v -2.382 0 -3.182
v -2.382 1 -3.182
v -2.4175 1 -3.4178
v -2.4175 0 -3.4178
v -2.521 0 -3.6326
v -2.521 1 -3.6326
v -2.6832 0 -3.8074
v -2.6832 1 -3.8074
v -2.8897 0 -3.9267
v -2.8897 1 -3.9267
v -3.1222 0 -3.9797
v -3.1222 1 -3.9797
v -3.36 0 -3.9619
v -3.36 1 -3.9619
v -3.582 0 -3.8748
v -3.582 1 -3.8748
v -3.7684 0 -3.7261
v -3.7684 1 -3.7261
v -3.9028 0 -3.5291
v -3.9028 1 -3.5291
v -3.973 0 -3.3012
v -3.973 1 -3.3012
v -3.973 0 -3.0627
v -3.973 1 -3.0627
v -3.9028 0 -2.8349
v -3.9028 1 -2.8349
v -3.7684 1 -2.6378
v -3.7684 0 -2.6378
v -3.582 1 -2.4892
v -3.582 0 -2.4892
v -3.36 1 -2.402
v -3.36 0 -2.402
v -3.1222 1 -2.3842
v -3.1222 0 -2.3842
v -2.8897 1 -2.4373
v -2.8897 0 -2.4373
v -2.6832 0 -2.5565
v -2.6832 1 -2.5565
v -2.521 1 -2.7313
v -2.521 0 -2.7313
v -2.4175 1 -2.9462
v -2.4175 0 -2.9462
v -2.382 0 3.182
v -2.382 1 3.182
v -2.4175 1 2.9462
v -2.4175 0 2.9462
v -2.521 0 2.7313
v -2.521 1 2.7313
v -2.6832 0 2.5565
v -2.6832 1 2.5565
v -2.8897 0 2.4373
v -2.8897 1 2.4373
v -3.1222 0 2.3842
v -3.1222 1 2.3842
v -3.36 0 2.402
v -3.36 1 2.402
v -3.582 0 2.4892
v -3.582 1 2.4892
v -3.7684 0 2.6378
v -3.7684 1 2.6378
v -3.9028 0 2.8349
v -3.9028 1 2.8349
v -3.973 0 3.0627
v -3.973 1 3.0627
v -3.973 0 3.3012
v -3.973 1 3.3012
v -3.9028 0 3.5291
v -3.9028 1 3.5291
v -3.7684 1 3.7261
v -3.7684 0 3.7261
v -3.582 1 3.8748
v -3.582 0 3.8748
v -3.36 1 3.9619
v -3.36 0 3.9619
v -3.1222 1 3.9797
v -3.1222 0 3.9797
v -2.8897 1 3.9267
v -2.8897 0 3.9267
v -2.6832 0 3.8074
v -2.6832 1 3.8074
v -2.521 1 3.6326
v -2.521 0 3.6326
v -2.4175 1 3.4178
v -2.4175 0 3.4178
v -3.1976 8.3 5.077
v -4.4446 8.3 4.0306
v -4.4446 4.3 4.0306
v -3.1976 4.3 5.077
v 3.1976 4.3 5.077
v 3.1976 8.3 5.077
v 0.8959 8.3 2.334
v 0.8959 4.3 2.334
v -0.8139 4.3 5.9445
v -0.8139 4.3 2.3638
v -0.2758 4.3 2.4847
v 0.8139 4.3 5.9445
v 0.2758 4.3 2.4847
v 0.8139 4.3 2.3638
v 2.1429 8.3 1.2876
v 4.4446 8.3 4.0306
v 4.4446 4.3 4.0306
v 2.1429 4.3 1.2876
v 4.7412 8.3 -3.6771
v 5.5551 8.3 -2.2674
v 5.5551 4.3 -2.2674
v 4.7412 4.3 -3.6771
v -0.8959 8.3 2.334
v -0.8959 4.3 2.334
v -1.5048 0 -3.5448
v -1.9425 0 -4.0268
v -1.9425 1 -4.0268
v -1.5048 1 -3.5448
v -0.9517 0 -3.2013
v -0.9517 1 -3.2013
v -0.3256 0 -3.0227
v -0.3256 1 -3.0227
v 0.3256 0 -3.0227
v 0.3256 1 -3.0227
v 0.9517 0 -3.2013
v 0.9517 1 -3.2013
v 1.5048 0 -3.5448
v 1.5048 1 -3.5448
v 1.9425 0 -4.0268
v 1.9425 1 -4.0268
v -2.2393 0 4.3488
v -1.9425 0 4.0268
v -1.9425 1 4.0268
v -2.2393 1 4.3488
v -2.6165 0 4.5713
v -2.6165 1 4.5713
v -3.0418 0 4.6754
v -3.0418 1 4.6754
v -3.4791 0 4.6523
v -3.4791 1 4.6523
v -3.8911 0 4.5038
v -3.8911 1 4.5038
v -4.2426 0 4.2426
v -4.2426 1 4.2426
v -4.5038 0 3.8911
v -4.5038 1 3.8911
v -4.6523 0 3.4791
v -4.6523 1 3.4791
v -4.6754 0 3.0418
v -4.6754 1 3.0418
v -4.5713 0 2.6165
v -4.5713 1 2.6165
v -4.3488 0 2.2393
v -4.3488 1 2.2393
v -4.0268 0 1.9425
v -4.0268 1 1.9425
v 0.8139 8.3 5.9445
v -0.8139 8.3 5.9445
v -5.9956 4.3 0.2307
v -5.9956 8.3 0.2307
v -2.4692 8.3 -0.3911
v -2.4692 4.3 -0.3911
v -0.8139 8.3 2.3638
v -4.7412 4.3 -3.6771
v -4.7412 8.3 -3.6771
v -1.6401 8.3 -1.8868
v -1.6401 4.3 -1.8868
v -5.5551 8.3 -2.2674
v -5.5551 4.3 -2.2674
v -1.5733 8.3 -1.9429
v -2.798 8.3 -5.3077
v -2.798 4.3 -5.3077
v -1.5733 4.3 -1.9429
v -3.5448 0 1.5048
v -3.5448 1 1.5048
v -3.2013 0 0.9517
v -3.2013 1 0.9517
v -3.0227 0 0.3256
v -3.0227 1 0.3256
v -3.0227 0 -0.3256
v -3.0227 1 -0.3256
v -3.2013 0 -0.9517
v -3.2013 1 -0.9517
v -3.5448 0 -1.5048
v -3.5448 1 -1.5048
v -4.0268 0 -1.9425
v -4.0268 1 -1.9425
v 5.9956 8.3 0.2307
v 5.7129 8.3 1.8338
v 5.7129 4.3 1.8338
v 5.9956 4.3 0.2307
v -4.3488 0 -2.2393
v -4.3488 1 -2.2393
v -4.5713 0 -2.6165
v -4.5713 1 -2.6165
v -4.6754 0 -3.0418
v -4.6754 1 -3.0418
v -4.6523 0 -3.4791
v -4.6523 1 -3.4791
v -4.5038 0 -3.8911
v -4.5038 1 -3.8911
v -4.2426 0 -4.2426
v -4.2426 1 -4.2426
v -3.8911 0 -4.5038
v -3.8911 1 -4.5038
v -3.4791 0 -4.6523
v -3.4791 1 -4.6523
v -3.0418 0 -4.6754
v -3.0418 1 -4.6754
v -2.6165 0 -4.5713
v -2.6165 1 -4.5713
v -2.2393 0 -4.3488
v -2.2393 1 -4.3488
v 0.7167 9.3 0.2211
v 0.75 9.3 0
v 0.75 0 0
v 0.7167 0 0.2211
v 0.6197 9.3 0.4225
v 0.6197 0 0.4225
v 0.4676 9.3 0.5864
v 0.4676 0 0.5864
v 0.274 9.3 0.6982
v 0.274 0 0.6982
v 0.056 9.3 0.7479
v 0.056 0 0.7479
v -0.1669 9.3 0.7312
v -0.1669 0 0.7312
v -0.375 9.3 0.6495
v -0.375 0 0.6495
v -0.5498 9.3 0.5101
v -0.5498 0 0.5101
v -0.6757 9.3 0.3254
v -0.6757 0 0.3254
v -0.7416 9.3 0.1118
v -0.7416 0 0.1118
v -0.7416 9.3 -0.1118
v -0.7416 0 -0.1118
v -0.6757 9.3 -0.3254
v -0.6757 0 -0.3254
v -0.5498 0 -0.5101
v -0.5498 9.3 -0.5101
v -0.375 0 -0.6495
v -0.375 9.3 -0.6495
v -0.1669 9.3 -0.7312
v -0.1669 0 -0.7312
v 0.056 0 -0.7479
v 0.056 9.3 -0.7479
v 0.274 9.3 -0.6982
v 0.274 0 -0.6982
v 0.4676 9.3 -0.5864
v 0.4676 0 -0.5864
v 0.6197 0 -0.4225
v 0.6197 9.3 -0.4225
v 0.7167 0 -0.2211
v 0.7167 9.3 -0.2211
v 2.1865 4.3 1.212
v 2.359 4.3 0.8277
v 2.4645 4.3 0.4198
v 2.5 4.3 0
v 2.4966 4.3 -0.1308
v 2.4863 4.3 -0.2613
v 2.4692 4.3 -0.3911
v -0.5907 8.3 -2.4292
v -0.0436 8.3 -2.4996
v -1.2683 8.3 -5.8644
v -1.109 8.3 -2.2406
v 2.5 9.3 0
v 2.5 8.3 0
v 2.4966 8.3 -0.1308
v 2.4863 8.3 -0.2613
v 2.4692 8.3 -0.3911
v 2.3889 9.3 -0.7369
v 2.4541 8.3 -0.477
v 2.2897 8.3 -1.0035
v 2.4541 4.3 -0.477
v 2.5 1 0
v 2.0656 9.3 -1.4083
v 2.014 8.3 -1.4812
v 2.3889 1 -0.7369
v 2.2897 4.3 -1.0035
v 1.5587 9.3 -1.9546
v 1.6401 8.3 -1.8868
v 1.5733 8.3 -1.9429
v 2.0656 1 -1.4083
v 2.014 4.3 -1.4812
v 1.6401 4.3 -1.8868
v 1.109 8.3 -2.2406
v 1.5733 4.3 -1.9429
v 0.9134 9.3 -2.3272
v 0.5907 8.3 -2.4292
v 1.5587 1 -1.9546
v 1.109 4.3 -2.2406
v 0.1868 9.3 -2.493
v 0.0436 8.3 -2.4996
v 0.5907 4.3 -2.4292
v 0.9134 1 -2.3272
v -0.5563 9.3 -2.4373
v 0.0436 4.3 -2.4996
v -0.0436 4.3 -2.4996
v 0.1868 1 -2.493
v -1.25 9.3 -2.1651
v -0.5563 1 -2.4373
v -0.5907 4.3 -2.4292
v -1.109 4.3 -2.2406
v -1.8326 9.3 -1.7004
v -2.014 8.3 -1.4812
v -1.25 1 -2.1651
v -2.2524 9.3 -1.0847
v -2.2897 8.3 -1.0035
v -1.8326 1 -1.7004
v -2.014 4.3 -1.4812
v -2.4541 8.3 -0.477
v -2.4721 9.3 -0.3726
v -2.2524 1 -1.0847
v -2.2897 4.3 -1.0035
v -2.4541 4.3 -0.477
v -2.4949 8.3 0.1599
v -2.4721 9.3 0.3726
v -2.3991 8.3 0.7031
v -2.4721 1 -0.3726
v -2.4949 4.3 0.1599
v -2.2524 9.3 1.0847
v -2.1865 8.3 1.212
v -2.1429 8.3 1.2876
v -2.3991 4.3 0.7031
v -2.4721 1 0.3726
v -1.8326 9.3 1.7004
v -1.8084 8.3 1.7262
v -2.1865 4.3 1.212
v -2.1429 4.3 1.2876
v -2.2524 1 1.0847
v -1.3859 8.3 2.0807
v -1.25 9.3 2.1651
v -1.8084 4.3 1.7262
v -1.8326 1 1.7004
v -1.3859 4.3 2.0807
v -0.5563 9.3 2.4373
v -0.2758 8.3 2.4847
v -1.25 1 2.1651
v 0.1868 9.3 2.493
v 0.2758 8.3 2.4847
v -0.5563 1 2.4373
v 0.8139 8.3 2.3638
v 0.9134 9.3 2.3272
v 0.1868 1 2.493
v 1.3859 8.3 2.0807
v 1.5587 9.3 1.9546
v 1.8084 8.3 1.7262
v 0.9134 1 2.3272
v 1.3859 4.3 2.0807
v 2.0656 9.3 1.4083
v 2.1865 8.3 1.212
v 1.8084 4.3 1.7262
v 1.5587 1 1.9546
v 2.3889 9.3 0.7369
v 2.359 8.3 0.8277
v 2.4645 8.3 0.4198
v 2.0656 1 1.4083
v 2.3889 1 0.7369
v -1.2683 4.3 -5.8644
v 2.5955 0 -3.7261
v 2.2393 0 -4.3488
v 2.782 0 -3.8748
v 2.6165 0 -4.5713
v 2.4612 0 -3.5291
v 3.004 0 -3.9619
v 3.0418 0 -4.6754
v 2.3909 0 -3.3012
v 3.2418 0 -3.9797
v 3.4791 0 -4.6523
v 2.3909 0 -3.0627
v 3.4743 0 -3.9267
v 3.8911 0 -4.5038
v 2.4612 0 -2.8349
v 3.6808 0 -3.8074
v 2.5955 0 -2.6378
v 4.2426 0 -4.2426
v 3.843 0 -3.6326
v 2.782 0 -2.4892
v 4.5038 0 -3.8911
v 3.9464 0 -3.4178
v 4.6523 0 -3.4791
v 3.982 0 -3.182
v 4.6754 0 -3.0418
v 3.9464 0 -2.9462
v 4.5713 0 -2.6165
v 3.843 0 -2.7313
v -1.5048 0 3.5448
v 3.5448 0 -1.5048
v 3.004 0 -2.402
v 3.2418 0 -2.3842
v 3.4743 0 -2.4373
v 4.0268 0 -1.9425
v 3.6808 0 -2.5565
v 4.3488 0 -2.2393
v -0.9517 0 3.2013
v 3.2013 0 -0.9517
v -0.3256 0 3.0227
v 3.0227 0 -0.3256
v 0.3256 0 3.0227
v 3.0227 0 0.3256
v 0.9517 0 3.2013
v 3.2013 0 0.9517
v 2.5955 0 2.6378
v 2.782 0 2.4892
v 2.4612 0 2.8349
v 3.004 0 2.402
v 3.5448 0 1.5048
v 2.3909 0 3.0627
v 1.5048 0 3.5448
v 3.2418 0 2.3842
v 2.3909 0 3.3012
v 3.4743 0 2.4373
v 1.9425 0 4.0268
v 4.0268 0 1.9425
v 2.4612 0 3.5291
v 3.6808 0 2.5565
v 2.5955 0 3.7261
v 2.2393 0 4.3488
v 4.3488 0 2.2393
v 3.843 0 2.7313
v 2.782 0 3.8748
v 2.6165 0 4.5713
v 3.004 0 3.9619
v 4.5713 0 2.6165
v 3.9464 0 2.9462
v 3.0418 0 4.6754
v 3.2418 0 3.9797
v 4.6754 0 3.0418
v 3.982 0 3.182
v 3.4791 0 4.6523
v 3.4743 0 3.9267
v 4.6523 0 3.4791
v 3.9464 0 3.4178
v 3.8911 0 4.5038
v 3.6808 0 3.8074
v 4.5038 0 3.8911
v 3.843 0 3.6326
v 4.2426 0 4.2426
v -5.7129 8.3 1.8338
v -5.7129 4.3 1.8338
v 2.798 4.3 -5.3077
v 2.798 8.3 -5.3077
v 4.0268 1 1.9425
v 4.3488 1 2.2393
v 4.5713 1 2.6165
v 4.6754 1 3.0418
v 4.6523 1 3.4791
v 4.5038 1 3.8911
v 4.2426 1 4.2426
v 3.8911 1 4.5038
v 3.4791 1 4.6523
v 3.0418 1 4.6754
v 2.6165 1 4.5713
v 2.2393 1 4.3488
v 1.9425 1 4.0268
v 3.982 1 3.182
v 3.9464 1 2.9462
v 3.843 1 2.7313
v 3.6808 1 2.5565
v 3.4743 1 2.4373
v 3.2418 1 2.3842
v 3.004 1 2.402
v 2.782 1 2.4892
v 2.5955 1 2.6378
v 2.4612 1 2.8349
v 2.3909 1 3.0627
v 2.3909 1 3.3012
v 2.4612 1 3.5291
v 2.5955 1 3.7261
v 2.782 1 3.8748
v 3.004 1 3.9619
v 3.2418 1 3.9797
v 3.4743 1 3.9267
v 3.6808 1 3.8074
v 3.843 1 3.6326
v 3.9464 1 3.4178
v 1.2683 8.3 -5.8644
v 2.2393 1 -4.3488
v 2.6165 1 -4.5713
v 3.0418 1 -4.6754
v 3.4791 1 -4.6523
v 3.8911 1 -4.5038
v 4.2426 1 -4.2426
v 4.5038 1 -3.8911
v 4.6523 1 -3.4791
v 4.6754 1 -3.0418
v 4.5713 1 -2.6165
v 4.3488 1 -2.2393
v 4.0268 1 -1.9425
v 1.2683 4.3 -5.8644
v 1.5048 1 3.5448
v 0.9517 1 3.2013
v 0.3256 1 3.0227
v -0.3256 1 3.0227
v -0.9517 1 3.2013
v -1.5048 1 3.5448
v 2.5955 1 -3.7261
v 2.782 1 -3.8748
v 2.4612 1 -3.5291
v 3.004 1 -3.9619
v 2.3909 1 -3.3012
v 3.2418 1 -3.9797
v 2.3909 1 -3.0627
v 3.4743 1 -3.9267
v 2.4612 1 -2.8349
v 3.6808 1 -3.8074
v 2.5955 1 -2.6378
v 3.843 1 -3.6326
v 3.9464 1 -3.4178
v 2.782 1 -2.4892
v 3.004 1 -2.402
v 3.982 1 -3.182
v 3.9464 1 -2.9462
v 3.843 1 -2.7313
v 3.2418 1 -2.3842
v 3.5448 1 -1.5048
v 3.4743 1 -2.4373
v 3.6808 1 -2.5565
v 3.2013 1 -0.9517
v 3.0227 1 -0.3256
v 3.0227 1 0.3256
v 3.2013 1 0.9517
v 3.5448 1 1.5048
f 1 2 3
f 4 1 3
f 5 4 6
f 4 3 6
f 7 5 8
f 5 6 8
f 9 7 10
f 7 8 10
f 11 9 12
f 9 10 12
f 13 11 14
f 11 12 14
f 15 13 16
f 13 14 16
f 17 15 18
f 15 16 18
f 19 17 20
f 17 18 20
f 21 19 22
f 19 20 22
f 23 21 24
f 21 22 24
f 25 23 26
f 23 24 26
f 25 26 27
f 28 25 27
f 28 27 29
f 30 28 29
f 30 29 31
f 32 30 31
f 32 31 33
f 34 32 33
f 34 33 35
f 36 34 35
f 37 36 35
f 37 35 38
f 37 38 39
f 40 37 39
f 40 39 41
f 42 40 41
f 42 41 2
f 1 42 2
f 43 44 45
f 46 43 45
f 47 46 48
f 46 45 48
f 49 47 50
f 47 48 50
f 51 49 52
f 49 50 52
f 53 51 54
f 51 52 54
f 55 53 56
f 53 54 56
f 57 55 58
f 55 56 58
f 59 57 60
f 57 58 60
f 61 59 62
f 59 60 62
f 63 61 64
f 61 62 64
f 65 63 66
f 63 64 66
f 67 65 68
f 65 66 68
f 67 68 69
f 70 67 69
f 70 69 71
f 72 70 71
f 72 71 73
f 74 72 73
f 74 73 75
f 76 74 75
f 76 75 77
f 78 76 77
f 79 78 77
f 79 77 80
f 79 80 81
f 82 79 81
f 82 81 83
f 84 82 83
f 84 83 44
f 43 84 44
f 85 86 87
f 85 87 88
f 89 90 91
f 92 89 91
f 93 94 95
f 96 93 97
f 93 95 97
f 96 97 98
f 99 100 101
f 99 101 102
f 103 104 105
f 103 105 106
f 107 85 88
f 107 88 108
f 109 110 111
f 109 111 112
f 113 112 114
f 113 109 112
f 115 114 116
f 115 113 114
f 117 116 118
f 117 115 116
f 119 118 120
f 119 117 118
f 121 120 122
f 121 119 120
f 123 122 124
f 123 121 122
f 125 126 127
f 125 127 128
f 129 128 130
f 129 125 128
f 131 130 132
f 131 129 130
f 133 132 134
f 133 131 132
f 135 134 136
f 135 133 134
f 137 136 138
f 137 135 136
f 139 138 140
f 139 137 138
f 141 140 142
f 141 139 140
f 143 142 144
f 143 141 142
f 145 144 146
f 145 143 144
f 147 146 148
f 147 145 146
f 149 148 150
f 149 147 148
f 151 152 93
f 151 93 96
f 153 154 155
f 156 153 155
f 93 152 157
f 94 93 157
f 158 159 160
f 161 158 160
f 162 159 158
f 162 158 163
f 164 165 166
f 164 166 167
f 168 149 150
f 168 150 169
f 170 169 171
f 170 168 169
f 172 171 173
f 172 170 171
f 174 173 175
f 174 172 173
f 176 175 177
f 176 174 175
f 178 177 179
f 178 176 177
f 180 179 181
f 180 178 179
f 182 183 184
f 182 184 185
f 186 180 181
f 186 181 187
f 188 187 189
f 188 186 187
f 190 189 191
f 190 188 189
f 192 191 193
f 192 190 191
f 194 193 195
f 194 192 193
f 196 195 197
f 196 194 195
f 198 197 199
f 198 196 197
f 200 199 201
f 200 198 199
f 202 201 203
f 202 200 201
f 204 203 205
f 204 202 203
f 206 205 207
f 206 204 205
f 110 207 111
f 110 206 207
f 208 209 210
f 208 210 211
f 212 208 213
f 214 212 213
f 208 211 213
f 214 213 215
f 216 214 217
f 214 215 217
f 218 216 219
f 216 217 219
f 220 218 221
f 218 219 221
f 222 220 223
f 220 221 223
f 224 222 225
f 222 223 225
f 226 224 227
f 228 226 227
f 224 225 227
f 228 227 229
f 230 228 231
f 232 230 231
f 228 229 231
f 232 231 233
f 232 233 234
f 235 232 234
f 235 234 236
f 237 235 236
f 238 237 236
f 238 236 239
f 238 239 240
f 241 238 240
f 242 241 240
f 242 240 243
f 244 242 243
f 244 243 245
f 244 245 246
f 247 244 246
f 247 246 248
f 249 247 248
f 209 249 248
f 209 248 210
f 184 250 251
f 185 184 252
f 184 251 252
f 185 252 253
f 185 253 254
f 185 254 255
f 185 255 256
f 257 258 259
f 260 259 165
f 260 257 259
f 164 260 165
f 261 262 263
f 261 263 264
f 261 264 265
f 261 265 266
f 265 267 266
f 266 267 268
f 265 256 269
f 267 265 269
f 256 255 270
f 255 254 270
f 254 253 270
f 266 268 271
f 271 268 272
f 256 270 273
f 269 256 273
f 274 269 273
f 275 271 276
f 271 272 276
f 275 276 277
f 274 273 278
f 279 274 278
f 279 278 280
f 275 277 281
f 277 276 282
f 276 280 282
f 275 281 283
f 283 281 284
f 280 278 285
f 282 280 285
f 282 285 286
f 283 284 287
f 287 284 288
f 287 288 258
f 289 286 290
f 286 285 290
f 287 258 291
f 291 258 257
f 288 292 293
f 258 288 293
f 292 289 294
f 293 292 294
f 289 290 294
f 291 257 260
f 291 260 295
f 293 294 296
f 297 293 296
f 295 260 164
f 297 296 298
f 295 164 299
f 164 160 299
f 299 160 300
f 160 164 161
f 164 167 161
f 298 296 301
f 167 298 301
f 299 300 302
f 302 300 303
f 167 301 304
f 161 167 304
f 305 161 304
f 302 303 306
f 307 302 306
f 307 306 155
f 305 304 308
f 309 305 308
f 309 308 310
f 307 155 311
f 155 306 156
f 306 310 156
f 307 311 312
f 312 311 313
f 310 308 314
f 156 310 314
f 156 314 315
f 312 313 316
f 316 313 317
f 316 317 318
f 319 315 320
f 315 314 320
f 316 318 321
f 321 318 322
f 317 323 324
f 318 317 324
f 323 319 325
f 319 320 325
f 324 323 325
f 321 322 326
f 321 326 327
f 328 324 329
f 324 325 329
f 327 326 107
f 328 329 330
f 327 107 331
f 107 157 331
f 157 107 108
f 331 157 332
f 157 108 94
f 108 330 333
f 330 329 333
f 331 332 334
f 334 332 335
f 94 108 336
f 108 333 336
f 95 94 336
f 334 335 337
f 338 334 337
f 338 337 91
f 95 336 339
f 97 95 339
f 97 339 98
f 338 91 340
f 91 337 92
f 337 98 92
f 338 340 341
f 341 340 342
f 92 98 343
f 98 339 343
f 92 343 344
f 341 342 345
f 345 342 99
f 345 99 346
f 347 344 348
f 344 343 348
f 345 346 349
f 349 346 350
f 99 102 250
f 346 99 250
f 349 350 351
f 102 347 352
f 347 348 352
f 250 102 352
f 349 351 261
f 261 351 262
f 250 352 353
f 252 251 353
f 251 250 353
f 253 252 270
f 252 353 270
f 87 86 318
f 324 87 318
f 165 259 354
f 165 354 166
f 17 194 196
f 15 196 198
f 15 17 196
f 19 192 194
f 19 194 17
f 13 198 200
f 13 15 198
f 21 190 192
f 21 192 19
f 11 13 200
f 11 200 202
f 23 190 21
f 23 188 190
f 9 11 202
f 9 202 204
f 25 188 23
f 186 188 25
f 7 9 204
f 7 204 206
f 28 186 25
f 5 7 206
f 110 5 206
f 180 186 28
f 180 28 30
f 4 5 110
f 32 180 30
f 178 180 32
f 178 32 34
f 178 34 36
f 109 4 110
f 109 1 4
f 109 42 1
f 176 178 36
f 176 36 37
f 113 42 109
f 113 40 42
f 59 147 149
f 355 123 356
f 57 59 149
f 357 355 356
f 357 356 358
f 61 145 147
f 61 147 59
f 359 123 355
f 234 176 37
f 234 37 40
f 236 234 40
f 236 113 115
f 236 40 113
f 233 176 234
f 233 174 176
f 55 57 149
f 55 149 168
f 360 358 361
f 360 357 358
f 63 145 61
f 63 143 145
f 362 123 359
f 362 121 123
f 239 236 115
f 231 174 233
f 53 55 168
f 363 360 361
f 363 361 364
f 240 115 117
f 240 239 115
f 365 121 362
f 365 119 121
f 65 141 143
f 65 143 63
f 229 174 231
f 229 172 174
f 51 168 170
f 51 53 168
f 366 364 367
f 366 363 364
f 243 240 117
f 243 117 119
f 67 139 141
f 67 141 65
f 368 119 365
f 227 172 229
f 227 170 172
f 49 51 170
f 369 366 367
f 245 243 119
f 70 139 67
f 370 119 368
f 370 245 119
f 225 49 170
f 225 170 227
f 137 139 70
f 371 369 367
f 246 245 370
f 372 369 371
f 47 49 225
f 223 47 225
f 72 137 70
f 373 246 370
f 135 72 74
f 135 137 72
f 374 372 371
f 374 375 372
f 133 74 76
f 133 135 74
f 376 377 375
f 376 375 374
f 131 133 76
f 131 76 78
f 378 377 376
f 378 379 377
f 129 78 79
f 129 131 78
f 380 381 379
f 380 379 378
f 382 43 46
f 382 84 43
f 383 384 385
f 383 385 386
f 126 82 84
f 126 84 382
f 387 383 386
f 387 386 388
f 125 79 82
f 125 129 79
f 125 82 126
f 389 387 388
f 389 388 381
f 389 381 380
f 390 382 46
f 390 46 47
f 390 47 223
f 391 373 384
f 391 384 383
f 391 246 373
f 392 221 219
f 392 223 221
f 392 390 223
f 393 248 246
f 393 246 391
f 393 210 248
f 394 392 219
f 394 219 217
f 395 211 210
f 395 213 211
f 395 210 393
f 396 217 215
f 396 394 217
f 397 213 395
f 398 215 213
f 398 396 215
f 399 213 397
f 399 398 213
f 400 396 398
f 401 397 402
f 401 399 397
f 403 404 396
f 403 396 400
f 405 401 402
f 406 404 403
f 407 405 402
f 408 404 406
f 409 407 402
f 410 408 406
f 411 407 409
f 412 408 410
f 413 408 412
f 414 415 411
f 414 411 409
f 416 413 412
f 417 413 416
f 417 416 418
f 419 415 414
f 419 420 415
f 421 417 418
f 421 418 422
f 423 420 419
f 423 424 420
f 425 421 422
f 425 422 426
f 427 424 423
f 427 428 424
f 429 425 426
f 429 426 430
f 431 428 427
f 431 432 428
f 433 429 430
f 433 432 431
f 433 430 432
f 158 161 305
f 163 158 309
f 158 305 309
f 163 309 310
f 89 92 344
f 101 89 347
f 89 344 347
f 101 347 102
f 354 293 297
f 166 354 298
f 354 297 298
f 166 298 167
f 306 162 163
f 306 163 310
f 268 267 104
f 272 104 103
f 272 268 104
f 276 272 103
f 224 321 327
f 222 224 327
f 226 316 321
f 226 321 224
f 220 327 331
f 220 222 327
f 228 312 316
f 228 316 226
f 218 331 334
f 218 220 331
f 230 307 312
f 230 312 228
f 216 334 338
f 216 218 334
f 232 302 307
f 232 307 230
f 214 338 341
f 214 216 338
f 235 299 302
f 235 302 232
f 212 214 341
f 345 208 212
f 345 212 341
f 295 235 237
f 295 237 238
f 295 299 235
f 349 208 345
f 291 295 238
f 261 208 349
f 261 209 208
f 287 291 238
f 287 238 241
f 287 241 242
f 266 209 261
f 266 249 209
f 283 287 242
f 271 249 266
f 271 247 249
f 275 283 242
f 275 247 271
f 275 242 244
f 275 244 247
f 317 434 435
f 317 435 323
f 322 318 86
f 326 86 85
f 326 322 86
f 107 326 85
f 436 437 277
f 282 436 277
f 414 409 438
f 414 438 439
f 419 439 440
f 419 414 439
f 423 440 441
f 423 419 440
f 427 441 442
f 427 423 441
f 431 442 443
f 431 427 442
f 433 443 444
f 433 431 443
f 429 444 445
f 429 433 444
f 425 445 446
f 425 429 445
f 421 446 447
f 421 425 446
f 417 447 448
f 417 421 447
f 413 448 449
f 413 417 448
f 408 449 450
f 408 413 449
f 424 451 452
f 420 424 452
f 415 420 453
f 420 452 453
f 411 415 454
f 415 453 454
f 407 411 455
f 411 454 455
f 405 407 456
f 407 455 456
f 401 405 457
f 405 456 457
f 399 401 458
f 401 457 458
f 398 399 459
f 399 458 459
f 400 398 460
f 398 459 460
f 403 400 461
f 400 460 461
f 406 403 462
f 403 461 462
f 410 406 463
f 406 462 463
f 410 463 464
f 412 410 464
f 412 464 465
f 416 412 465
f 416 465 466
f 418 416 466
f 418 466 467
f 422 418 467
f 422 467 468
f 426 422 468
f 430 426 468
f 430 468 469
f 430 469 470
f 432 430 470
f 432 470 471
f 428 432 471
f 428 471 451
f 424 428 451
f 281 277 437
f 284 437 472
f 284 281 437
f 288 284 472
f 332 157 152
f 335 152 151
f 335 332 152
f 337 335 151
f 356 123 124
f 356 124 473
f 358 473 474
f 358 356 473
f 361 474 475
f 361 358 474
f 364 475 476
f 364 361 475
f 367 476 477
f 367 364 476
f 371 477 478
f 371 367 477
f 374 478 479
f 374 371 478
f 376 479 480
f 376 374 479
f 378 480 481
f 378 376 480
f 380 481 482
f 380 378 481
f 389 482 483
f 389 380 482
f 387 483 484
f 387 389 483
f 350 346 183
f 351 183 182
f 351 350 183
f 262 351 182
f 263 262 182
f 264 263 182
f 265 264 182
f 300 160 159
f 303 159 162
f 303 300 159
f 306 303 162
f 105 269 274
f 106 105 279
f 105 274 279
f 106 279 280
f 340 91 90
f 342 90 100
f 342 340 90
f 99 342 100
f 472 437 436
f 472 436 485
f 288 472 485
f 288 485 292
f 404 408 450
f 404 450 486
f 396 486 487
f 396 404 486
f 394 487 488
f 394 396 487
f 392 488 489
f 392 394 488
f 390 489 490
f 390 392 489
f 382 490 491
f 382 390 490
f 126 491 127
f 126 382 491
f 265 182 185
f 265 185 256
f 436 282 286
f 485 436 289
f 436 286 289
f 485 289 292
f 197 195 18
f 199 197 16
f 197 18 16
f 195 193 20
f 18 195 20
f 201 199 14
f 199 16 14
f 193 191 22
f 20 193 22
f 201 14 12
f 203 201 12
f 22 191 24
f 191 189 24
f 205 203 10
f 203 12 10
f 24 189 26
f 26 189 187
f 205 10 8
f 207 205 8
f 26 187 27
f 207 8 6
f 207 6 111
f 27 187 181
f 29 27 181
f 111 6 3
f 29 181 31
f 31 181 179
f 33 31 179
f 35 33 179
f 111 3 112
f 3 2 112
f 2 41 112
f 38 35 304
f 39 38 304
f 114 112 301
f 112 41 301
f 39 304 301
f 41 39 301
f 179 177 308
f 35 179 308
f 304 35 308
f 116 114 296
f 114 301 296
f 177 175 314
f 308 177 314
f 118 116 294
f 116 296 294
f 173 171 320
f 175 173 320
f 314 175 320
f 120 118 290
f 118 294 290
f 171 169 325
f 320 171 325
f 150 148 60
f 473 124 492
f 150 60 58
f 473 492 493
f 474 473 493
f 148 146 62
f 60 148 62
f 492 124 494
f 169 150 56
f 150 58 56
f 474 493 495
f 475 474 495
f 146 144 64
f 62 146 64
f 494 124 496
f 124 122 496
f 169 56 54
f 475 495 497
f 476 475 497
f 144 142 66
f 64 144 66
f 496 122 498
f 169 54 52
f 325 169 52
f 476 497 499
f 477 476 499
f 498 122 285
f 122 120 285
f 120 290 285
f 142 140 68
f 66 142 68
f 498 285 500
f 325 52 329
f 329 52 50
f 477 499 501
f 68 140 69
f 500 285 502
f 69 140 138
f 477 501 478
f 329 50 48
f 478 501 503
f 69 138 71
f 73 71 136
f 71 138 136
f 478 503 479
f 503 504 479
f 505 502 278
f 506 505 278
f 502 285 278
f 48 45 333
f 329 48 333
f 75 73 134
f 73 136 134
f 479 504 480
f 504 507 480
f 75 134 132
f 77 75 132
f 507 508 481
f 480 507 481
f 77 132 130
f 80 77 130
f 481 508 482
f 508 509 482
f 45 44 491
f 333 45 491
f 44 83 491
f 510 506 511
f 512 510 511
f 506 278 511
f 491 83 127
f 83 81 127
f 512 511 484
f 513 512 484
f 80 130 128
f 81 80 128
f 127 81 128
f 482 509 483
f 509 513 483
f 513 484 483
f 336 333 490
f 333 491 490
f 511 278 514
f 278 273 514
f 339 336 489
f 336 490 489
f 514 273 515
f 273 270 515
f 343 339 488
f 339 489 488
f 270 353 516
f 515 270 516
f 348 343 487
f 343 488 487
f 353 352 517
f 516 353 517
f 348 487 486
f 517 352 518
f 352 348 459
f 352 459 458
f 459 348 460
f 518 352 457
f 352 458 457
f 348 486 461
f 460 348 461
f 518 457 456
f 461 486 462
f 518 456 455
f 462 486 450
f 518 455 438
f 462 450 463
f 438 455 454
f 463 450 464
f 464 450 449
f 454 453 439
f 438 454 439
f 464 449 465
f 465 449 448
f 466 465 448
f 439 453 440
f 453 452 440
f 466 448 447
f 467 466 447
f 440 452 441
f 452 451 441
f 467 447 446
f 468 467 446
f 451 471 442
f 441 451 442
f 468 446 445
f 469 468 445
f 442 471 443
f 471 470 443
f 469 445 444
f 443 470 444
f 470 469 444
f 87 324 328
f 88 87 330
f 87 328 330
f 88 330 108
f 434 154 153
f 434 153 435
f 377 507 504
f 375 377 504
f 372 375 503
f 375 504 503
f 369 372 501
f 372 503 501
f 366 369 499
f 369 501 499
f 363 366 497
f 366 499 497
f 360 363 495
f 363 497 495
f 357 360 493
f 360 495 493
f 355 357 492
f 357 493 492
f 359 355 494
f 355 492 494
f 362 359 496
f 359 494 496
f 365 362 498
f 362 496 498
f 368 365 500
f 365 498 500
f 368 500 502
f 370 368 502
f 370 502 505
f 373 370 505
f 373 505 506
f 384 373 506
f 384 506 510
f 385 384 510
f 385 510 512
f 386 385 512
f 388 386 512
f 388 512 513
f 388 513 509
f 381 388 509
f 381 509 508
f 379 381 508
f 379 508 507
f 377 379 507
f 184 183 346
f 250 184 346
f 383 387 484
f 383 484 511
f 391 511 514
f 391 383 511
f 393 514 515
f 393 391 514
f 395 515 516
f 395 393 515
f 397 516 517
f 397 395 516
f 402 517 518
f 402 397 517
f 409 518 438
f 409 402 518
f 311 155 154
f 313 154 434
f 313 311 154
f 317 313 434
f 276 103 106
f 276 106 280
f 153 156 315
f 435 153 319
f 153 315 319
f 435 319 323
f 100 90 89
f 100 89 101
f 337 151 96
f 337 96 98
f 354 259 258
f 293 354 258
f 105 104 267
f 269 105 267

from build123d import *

# Parameters (mm, degrees)
SKETCH1_R                 = 2.5
BOSS_EXTRUDE1_DEPTH       = 9.3
BOSS_EXTRUDE2_START       = -1
SKETCH3_W                 = 1.627840772
SKETCH3_H                 = 5.944538132
BOSS_EXTRUDE2_DEPTH       = 4
CIRPATTERN1_COUNT         = 9
BOSS_EXTRUDE3_DEPTH       = 1
M2X0_4_TAPPED_HOLE1_D     = 1.6
M2X0_4_TAPPED_HOLE1_DEPTH = 1
SKETCH7_R                 = 0.75
CUT_EXTRUDE1_DEPTH        = 10.3


with BuildPart() as part:
    # Sketch1 → Boss-Extrude1 (new body)
    with BuildSketch(Plane(origin=(0, 0, 0), x_dir=(1, 0, 0), z_dir=(0, 1, 0))):
        Circle(SKETCH1_R)
    extrude(amount=BOSS_EXTRUDE1_DEPTH)

    # Sketch3 → Boss-Extrude2 (add)
    with BuildSketch(Plane(origin=(0, 9.3, 0), x_dir=(1, 0, 0), z_dir=(0, 1, 0)).offset(BOSS_EXTRUDE2_START)):
        with Locations((0, -2.972269066)):
            Rectangle(SKETCH3_W, SKETCH3_H)
    boss_extrude2 = extrude(amount=-BOSS_EXTRUDE2_DEPTH)

    # CirPattern1: Boss-Extrude2 ×9 about axis
    cirpattern1_axis = Axis((0, 0, 0), (0, 1, 0))
    for i in range(1, CIRPATTERN1_COUNT):
        add(boss_extrude2.rotate(cirpattern1_axis, i * 360 / CIRPATTERN1_COUNT))

    # Sketch4 → Boss-Extrude3 (add)
    with BuildSketch(Plane.XZ):
        with BuildLine():
            ThreePointArc((-1.942516625, 4.026805507), (-4.242640687, 4.242640687), (-4.026805507, 1.942516625))
            ThreePointArc((-4.026805507, 1.942516625), (-3, 0), (-4.026805507, -1.942516625))
            ThreePointArc((-4.026805507, -1.942516625), (-4.242640687, -4.242640687), (-1.942516625, -4.026805507))
            ThreePointArc((-1.942516625, -4.026805507), (0, -3), (1.942516625, -4.026805507))
            ThreePointArc((1.942516625, -4.026805507), (4.242640687, -4.242640687), (4.026805507, -1.942516625))
            ThreePointArc((4.026805507, -1.942516625), (3, 0), (4.026805507, 1.942516625))
            ThreePointArc((4.026805507, 1.942516625), (4.242640687, 4.242640687), (1.942516625, 4.026805507))
            ThreePointArc((1.942516625, 4.026805507), (0, 3), (-1.942516625, 4.026805507))
        make_face()
    extrude(amount=-BOSS_EXTRUDE3_DEPTH)

    # M2x0.4 Tapped Hole1
    with Locations(Plane(origin=(0, 0, 0), x_dir=(-1, 0, 0), z_dir=(0, -1, 0))):
        with Locations((3.181980515, 3.181980515), (-3.181980515, 3.181980515), (-3.181980515, -3.181980515), (3.181980515, -3.181980515)):
            Hole(M2X0_4_TAPPED_HOLE1_D / 2, depth=M2X0_4_TAPPED_HOLE1_DEPTH)

    # Sketch7 → Cut-Extrude1 (cut, through all)
    with BuildSketch(Plane.XZ):
        Circle(SKETCH7_R)
    extrude(amount=-CUT_EXTRUDE1_DEPTH, mode=Mode.SUBTRACT)


solid = part.part
